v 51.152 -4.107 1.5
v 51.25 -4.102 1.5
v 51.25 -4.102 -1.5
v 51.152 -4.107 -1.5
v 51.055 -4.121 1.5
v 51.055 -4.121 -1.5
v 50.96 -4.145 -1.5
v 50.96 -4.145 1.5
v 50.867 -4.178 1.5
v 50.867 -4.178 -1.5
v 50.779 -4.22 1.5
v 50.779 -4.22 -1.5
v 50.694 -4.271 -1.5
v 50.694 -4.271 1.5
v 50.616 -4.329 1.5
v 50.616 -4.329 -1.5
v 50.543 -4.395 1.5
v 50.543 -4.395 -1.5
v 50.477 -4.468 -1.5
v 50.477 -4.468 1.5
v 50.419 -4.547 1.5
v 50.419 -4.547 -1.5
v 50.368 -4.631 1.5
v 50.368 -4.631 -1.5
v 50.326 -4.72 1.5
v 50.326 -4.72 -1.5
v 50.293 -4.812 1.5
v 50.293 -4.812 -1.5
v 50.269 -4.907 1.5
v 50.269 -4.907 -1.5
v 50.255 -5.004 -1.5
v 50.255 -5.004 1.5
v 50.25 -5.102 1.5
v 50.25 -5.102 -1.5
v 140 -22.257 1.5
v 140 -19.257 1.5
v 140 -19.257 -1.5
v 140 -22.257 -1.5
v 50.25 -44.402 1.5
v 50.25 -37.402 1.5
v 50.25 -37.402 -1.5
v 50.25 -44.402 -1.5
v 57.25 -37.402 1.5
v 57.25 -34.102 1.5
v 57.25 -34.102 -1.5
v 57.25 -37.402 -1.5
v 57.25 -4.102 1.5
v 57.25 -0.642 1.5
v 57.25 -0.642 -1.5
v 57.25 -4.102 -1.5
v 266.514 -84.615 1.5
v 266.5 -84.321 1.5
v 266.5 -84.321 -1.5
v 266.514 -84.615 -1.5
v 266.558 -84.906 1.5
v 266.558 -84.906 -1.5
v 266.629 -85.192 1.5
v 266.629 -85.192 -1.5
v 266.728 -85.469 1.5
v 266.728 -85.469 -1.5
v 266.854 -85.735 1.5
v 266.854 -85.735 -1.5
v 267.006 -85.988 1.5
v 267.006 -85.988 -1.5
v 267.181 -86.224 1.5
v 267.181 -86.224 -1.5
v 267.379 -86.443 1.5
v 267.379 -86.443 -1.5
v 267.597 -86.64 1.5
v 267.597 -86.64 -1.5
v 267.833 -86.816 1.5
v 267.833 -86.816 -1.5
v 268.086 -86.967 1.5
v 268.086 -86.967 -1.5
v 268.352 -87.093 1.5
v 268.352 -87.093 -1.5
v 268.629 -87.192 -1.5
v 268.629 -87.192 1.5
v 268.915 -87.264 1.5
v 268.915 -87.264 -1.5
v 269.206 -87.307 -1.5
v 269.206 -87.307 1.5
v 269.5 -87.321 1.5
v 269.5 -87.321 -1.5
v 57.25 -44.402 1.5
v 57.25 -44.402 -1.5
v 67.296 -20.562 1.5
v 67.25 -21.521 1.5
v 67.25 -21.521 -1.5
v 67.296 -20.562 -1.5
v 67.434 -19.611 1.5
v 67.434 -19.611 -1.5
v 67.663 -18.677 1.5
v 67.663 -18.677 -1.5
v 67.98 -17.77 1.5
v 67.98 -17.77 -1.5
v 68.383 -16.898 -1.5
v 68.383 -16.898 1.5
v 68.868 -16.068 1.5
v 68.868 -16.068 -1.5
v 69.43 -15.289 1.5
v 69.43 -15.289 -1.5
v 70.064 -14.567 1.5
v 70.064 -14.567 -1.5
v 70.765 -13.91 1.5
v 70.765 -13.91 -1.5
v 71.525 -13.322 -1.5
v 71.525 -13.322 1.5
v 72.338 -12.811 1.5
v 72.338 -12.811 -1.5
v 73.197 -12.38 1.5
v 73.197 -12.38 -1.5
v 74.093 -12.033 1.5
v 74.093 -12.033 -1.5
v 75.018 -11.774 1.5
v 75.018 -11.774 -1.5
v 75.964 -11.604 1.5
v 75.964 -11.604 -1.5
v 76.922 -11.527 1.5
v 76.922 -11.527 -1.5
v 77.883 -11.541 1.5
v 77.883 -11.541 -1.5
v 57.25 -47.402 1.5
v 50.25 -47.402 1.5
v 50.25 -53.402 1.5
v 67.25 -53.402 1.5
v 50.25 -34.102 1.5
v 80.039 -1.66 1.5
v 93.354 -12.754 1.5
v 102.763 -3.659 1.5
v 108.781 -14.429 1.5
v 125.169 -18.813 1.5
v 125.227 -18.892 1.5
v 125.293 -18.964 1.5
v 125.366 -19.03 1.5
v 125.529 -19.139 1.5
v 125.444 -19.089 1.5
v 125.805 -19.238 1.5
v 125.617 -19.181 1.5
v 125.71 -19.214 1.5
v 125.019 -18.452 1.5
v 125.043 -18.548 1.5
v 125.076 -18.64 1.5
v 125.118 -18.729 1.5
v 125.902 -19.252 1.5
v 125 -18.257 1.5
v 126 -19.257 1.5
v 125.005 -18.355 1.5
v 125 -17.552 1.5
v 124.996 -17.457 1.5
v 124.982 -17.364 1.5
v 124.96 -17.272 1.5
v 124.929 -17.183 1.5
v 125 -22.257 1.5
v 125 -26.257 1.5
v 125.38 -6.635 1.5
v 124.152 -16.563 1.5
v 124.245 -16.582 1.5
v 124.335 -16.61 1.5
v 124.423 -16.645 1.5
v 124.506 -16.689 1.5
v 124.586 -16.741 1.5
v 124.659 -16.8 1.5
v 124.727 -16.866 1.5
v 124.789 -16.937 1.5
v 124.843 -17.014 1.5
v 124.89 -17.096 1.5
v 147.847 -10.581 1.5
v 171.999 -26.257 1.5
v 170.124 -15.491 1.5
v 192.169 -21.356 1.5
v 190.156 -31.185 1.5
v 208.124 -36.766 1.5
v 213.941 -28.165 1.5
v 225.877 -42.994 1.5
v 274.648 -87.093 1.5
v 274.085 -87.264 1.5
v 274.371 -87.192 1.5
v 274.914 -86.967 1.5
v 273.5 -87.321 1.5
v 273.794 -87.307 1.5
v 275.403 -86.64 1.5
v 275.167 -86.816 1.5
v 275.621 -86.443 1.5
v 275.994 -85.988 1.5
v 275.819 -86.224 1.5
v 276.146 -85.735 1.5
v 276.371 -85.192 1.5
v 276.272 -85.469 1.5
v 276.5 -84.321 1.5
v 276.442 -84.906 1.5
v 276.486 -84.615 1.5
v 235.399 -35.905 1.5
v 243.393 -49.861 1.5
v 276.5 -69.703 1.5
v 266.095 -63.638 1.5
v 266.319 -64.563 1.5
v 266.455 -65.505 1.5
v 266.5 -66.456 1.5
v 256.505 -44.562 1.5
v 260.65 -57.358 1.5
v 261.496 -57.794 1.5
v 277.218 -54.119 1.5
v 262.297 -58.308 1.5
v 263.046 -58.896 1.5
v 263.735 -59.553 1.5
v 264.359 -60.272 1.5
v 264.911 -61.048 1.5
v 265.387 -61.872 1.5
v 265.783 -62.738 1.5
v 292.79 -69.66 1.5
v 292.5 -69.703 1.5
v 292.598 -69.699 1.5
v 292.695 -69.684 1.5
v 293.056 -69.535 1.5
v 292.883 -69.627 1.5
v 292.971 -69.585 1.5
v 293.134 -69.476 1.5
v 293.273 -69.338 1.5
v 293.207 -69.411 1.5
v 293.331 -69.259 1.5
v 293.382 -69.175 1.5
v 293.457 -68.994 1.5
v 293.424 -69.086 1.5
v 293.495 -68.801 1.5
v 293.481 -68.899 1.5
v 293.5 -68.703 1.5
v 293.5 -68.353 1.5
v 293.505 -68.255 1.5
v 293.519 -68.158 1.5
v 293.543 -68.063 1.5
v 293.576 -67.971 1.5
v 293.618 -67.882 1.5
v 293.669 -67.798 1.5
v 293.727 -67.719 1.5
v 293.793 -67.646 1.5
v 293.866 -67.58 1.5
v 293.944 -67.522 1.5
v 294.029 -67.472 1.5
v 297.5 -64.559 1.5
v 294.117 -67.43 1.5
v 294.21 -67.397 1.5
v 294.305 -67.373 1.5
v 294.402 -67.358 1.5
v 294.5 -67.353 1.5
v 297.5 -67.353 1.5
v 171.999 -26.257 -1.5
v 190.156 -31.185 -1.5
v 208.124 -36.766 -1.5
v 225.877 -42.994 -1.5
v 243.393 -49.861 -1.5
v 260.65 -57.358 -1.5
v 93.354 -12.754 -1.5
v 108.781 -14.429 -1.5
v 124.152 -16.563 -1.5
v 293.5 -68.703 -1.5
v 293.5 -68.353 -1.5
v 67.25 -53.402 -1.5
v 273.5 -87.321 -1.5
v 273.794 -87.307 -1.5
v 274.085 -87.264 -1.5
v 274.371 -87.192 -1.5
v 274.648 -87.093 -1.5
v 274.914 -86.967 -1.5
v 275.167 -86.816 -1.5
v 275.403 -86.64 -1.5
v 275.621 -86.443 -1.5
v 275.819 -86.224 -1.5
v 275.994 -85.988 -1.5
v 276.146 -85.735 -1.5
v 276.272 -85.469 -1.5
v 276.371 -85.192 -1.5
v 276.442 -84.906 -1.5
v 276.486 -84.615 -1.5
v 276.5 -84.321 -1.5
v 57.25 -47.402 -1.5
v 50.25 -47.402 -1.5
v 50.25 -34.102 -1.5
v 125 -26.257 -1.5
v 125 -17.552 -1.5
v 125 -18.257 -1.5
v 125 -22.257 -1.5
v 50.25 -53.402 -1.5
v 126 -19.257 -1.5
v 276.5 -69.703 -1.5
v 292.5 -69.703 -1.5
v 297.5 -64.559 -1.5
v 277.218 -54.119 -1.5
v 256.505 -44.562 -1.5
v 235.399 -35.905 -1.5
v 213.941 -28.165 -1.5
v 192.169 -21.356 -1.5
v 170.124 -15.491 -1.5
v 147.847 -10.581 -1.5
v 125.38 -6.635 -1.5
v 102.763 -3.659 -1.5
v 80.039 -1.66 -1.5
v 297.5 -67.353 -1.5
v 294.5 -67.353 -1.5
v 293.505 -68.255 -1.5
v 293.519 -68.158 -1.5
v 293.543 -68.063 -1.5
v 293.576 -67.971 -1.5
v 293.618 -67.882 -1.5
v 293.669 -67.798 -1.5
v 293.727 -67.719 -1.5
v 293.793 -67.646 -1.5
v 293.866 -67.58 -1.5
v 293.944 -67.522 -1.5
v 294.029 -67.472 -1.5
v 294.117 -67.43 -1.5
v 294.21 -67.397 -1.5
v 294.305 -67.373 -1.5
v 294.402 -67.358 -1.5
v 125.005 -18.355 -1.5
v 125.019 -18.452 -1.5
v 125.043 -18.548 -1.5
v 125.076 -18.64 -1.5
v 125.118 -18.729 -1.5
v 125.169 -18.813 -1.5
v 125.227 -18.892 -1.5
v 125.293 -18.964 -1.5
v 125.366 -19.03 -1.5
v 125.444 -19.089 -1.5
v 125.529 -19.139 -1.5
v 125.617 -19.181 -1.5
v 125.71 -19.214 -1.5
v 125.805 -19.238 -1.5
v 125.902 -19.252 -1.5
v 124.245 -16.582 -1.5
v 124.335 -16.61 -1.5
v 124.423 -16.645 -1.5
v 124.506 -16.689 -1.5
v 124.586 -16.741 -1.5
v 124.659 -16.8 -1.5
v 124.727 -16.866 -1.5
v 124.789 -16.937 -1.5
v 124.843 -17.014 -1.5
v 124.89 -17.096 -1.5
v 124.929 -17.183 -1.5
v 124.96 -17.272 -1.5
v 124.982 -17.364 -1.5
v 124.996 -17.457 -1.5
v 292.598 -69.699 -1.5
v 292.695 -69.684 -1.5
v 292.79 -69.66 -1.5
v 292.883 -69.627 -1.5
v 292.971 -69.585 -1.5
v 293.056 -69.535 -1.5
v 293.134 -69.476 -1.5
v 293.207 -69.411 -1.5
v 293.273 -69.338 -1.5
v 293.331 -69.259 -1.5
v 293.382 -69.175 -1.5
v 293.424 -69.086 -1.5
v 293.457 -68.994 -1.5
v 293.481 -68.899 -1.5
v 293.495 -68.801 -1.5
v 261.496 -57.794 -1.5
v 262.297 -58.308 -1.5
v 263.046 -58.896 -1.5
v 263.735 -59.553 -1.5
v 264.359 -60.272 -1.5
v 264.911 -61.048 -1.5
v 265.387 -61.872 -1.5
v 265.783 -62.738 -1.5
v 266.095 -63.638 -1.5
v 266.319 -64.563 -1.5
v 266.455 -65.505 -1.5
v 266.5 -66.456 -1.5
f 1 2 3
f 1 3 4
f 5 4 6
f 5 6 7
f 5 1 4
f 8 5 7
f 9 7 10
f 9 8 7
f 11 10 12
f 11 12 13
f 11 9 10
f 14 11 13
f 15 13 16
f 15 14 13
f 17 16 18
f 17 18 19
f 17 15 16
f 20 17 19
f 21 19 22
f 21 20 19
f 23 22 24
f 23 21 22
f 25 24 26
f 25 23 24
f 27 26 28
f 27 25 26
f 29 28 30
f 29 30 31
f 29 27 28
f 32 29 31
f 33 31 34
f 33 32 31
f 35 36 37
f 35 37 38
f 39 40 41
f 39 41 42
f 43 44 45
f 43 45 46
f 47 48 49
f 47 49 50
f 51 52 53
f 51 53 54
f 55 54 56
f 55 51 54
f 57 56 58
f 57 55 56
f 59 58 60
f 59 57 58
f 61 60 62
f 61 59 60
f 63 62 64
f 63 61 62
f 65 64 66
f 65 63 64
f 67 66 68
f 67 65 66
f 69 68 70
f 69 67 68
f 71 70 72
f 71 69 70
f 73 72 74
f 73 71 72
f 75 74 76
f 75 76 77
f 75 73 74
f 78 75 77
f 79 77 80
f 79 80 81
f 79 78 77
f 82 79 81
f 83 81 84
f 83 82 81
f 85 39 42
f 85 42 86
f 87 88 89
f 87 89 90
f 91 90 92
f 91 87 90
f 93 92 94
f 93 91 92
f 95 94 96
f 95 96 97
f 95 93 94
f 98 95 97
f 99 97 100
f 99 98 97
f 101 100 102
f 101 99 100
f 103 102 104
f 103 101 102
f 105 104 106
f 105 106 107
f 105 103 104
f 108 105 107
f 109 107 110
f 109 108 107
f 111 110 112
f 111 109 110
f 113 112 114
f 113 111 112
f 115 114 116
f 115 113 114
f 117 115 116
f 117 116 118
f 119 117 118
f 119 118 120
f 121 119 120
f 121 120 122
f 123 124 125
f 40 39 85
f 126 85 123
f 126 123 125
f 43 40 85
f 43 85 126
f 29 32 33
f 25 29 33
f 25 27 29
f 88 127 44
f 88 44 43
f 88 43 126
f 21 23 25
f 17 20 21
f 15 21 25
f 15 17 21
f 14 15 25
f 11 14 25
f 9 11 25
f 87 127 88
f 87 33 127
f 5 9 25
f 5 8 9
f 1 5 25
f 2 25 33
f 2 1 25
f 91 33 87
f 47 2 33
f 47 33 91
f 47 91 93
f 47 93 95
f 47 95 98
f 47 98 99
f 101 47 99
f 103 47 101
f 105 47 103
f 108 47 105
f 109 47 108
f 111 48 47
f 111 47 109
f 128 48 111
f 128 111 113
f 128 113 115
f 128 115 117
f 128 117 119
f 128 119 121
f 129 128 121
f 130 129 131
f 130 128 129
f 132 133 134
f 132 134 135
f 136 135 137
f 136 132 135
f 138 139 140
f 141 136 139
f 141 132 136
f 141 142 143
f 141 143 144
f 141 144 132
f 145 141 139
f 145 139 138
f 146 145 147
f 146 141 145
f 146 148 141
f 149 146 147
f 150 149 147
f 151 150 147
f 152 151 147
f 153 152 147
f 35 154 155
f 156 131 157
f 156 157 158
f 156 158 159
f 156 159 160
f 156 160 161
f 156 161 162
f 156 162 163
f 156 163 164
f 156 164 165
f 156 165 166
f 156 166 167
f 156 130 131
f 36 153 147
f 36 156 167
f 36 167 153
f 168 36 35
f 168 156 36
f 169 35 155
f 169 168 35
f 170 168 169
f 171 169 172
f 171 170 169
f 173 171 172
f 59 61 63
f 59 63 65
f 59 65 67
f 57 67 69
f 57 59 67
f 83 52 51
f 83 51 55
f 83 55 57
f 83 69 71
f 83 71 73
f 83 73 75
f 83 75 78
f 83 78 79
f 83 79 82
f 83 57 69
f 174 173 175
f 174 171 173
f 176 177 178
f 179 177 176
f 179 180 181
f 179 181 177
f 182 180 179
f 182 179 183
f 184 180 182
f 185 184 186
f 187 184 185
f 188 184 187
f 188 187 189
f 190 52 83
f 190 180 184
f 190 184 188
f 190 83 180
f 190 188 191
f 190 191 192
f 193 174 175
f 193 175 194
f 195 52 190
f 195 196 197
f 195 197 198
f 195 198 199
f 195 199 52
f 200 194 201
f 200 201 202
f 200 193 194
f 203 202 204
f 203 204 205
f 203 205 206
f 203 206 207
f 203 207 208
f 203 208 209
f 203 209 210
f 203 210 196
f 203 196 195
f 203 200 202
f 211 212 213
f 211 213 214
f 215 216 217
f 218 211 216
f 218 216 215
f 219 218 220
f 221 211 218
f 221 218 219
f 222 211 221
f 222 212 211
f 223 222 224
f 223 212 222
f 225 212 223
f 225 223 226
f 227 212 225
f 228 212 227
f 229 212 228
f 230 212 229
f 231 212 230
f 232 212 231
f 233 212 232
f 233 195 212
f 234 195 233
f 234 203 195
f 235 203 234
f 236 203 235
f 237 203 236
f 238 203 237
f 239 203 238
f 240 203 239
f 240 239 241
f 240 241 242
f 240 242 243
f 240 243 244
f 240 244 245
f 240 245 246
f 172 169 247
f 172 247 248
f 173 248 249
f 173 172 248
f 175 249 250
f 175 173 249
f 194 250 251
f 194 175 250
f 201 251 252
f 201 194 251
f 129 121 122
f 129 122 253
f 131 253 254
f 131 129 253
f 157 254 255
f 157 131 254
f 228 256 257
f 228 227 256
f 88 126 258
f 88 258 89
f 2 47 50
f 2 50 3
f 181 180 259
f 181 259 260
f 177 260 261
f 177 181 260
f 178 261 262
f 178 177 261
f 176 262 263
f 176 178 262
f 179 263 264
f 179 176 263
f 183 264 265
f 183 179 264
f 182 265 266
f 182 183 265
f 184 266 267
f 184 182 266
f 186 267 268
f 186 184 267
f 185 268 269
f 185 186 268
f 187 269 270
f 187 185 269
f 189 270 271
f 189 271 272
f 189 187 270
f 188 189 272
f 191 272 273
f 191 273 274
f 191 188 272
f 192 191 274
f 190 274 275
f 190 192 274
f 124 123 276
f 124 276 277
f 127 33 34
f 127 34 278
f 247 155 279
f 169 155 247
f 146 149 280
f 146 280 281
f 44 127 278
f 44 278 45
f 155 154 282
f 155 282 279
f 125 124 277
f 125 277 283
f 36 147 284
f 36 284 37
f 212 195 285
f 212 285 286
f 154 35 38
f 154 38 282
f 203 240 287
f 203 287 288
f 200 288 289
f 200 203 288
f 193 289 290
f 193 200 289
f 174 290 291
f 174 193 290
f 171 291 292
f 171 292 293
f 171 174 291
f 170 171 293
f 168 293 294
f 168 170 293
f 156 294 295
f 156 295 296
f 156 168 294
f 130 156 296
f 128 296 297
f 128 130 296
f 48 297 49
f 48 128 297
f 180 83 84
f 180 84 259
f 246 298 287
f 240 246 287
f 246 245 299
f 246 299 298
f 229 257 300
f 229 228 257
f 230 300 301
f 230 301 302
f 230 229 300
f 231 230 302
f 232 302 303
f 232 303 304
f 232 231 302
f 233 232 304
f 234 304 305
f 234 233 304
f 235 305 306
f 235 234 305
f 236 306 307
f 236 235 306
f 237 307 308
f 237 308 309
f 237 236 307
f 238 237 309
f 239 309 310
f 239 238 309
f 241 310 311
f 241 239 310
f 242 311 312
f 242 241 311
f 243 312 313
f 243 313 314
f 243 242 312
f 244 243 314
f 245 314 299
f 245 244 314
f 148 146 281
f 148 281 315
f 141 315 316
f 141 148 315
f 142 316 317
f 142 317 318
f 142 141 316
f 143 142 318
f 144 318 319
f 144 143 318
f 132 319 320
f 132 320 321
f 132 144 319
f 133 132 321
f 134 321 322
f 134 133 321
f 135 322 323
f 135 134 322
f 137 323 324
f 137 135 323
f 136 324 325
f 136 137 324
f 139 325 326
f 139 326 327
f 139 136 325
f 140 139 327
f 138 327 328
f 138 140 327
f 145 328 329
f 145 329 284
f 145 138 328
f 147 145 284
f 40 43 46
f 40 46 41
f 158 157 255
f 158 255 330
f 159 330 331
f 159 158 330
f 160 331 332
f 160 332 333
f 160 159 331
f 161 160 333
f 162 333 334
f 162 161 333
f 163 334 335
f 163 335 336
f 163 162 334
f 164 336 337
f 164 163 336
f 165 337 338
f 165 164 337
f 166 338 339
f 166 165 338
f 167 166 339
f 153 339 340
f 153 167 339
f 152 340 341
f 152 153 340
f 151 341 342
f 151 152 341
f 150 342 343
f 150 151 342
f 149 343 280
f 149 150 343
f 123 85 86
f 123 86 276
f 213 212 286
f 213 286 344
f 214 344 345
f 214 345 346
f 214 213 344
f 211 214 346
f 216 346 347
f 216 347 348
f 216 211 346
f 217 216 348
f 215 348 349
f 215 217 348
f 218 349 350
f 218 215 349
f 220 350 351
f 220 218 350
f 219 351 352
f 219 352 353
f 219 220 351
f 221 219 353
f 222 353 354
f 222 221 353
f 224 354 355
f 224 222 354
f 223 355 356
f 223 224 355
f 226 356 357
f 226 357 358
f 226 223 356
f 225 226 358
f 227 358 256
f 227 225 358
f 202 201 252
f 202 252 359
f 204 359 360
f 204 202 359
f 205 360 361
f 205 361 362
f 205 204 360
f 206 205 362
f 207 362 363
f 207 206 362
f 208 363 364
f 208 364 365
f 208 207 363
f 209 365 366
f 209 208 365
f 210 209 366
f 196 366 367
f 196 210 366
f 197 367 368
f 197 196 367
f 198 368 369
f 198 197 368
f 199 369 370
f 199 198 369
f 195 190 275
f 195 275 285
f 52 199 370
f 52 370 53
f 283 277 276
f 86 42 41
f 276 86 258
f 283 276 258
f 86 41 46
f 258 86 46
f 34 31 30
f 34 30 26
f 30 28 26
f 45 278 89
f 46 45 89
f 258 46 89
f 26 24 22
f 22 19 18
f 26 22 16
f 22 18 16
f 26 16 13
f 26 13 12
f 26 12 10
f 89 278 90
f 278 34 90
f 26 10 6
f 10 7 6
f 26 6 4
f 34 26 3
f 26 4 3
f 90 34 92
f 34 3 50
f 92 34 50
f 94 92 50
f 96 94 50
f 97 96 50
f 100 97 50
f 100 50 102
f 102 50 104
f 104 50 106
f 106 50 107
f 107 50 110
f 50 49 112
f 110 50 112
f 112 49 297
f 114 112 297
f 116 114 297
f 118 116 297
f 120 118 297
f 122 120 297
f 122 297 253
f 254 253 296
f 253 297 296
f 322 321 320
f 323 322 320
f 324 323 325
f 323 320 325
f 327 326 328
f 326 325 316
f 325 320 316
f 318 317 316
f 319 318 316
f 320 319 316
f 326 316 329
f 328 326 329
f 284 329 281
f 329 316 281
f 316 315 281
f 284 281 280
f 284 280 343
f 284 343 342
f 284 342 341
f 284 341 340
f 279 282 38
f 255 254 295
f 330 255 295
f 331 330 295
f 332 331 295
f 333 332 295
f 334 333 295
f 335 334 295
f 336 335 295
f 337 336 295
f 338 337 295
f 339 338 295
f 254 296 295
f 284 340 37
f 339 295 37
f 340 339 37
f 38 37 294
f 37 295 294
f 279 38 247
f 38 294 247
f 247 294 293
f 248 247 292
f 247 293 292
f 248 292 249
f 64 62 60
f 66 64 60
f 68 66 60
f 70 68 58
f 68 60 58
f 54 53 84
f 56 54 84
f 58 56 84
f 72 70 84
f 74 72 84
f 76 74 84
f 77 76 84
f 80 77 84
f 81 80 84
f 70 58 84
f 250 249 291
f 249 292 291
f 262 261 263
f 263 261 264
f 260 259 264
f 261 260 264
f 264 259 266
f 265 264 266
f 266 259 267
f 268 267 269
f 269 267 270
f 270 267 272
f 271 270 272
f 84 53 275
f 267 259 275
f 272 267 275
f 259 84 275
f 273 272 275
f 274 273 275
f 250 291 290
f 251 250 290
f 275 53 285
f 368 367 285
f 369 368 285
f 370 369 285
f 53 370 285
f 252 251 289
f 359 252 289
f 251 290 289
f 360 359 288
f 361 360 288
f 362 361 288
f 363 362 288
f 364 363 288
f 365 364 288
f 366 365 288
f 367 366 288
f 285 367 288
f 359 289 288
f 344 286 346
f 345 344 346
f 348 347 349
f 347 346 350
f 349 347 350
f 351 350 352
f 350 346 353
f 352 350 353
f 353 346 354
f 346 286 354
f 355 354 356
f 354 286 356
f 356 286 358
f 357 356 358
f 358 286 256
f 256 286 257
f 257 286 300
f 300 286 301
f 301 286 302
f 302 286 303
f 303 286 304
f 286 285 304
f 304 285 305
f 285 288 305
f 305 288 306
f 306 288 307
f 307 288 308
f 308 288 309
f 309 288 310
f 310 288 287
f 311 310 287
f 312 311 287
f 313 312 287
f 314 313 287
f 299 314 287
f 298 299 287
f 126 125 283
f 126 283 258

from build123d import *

# Parameters (mm, degrees)
BOSS_EXTRUDE1_DEPTH = 1.5
SKETCH4_W           = 2
SKETCH4_H           = 7.019019915
CUT_EXTRUDE2_DEPTH  = 3


with BuildPart() as part:
    # Sketch2 → Boss-Extrude1 (new, symmetric)
    with BuildSketch(Plane.XY):
        with BuildLine():
            Line((294.5, -67.353443934), (299.5, -67.353443934))
            Line((299.5, -67.353443934), (299.5, -65.649534053))
            ThreePointArc((299.5, -65.649534053), (182.278534334, -18.599191723), (57.25, -0.641677179))
            Line((57.25, -0.641677179), (57.25, -4.102198064))
            Line((57.25, -4.102198064), (51.25, -4.102198064))
            ThreePointArc((51.25, -4.102198064), (50.542893219, -4.395091282), (50.25, -5.102198064))
            Line((50.25, -5.102198064), (50.25, -34.102198064))
            Line((50.25, -34.102198064), (57.25, -34.102198064))
            Line((57.25, -34.102198064), (57.25, -37.402198064))
            Line((57.25, -37.402198064), (50.25, -37.402198064))
            Line((50.25, -37.402198064), (50.25, -44.402198064))
            Line((50.25, -44.402198064), (57.25, -44.402198064))
            Line((57.25, -44.402198064), (57.25, -47.402198064))
            Line((57.25, -47.402198064), (50.25, -47.402198064))
            Line((50.25, -47.402198064), (50.25, -53.402198064))
            Line((50.25, -53.402198064), (67.25, -53.402198064))
            Line((67.25, -53.402198064), (67.25, -38.8))
            Line((67.25, -38.8), (67.25, -21.521364961))
            ThreePointArc((67.25, -21.521364961), (70.406305806, -14.230010507), (77.882769957, -11.541404932))
            ThreePointArc((77.882769957, -11.541404932), (101.0737918, -13.534149792), (124.152314439, -16.563393762))
            ThreePointArc((124.152314439, -16.563393762), (124.759050209, -16.900693759), (125, -17.551725847))
            Line((125, -17.551725847), (125, -18.257285386))
            ThreePointArc((125, -18.257285386), (125.292893219, -18.964392167), (126, -19.257285386))
            Line((126, -19.257285386), (140, -19.257285386))
            Line((140, -19.257285386), (140, -22.257285386))
            Line((140, -22.257285386), (125, -22.257285386))
            Line((125, -22.257285386), (125, -26.257285386))
            Line((125, -26.257285386), (171.998789441, -26.257285386))
            ThreePointArc((171.998789441, -26.257285386), (217.028547909, -39.800007252), (260.649793668, -57.357666027))
            ThreePointArc((260.649793668, -57.357666027), (264.911240595, -61.04755196), (266.5, -66.455974249))
            Line((266.5, -66.455974249), (266.5, -84.321193081))
            ThreePointArc((266.5, -84.321193081), (267.378679656, -86.442513425), (269.5, -87.321193081))
            Line((269.5, -87.321193081), (273.5, -87.321193081))
            ThreePointArc((273.5, -87.321193081), (275.621320344, -86.442513425), (276.5, -84.321193081))
            Line((276.5, -84.321193081), (276.5, -69.703443934))
            Line((276.5, -69.703443934), (292.5, -69.703443934))
            ThreePointArc((292.5, -69.703443934), (293.207106781, -69.410550715), (293.5, -68.703443934))
            Line((293.5, -68.703443934), (293.5, -68.353443934))
            ThreePointArc((293.5, -68.353443934), (293.792893219, -67.646337153), (294.5, -67.353443934))
        make_face()
    extrude(amount=BOSS_EXTRUDE1_DEPTH, both=True)

    # Sketch4 → Cut-Extrude2 (cut)
    with BuildSketch(Plane.XY.offset(-1.5)):
        with Locations((298.5, -66.105228371)):
            Rectangle(SKETCH4_W, SKETCH4_H)
    extrude(amount=CUT_EXTRUDE2_DEPTH, mode=Mode.SUBTRACT)


solid = part.part
